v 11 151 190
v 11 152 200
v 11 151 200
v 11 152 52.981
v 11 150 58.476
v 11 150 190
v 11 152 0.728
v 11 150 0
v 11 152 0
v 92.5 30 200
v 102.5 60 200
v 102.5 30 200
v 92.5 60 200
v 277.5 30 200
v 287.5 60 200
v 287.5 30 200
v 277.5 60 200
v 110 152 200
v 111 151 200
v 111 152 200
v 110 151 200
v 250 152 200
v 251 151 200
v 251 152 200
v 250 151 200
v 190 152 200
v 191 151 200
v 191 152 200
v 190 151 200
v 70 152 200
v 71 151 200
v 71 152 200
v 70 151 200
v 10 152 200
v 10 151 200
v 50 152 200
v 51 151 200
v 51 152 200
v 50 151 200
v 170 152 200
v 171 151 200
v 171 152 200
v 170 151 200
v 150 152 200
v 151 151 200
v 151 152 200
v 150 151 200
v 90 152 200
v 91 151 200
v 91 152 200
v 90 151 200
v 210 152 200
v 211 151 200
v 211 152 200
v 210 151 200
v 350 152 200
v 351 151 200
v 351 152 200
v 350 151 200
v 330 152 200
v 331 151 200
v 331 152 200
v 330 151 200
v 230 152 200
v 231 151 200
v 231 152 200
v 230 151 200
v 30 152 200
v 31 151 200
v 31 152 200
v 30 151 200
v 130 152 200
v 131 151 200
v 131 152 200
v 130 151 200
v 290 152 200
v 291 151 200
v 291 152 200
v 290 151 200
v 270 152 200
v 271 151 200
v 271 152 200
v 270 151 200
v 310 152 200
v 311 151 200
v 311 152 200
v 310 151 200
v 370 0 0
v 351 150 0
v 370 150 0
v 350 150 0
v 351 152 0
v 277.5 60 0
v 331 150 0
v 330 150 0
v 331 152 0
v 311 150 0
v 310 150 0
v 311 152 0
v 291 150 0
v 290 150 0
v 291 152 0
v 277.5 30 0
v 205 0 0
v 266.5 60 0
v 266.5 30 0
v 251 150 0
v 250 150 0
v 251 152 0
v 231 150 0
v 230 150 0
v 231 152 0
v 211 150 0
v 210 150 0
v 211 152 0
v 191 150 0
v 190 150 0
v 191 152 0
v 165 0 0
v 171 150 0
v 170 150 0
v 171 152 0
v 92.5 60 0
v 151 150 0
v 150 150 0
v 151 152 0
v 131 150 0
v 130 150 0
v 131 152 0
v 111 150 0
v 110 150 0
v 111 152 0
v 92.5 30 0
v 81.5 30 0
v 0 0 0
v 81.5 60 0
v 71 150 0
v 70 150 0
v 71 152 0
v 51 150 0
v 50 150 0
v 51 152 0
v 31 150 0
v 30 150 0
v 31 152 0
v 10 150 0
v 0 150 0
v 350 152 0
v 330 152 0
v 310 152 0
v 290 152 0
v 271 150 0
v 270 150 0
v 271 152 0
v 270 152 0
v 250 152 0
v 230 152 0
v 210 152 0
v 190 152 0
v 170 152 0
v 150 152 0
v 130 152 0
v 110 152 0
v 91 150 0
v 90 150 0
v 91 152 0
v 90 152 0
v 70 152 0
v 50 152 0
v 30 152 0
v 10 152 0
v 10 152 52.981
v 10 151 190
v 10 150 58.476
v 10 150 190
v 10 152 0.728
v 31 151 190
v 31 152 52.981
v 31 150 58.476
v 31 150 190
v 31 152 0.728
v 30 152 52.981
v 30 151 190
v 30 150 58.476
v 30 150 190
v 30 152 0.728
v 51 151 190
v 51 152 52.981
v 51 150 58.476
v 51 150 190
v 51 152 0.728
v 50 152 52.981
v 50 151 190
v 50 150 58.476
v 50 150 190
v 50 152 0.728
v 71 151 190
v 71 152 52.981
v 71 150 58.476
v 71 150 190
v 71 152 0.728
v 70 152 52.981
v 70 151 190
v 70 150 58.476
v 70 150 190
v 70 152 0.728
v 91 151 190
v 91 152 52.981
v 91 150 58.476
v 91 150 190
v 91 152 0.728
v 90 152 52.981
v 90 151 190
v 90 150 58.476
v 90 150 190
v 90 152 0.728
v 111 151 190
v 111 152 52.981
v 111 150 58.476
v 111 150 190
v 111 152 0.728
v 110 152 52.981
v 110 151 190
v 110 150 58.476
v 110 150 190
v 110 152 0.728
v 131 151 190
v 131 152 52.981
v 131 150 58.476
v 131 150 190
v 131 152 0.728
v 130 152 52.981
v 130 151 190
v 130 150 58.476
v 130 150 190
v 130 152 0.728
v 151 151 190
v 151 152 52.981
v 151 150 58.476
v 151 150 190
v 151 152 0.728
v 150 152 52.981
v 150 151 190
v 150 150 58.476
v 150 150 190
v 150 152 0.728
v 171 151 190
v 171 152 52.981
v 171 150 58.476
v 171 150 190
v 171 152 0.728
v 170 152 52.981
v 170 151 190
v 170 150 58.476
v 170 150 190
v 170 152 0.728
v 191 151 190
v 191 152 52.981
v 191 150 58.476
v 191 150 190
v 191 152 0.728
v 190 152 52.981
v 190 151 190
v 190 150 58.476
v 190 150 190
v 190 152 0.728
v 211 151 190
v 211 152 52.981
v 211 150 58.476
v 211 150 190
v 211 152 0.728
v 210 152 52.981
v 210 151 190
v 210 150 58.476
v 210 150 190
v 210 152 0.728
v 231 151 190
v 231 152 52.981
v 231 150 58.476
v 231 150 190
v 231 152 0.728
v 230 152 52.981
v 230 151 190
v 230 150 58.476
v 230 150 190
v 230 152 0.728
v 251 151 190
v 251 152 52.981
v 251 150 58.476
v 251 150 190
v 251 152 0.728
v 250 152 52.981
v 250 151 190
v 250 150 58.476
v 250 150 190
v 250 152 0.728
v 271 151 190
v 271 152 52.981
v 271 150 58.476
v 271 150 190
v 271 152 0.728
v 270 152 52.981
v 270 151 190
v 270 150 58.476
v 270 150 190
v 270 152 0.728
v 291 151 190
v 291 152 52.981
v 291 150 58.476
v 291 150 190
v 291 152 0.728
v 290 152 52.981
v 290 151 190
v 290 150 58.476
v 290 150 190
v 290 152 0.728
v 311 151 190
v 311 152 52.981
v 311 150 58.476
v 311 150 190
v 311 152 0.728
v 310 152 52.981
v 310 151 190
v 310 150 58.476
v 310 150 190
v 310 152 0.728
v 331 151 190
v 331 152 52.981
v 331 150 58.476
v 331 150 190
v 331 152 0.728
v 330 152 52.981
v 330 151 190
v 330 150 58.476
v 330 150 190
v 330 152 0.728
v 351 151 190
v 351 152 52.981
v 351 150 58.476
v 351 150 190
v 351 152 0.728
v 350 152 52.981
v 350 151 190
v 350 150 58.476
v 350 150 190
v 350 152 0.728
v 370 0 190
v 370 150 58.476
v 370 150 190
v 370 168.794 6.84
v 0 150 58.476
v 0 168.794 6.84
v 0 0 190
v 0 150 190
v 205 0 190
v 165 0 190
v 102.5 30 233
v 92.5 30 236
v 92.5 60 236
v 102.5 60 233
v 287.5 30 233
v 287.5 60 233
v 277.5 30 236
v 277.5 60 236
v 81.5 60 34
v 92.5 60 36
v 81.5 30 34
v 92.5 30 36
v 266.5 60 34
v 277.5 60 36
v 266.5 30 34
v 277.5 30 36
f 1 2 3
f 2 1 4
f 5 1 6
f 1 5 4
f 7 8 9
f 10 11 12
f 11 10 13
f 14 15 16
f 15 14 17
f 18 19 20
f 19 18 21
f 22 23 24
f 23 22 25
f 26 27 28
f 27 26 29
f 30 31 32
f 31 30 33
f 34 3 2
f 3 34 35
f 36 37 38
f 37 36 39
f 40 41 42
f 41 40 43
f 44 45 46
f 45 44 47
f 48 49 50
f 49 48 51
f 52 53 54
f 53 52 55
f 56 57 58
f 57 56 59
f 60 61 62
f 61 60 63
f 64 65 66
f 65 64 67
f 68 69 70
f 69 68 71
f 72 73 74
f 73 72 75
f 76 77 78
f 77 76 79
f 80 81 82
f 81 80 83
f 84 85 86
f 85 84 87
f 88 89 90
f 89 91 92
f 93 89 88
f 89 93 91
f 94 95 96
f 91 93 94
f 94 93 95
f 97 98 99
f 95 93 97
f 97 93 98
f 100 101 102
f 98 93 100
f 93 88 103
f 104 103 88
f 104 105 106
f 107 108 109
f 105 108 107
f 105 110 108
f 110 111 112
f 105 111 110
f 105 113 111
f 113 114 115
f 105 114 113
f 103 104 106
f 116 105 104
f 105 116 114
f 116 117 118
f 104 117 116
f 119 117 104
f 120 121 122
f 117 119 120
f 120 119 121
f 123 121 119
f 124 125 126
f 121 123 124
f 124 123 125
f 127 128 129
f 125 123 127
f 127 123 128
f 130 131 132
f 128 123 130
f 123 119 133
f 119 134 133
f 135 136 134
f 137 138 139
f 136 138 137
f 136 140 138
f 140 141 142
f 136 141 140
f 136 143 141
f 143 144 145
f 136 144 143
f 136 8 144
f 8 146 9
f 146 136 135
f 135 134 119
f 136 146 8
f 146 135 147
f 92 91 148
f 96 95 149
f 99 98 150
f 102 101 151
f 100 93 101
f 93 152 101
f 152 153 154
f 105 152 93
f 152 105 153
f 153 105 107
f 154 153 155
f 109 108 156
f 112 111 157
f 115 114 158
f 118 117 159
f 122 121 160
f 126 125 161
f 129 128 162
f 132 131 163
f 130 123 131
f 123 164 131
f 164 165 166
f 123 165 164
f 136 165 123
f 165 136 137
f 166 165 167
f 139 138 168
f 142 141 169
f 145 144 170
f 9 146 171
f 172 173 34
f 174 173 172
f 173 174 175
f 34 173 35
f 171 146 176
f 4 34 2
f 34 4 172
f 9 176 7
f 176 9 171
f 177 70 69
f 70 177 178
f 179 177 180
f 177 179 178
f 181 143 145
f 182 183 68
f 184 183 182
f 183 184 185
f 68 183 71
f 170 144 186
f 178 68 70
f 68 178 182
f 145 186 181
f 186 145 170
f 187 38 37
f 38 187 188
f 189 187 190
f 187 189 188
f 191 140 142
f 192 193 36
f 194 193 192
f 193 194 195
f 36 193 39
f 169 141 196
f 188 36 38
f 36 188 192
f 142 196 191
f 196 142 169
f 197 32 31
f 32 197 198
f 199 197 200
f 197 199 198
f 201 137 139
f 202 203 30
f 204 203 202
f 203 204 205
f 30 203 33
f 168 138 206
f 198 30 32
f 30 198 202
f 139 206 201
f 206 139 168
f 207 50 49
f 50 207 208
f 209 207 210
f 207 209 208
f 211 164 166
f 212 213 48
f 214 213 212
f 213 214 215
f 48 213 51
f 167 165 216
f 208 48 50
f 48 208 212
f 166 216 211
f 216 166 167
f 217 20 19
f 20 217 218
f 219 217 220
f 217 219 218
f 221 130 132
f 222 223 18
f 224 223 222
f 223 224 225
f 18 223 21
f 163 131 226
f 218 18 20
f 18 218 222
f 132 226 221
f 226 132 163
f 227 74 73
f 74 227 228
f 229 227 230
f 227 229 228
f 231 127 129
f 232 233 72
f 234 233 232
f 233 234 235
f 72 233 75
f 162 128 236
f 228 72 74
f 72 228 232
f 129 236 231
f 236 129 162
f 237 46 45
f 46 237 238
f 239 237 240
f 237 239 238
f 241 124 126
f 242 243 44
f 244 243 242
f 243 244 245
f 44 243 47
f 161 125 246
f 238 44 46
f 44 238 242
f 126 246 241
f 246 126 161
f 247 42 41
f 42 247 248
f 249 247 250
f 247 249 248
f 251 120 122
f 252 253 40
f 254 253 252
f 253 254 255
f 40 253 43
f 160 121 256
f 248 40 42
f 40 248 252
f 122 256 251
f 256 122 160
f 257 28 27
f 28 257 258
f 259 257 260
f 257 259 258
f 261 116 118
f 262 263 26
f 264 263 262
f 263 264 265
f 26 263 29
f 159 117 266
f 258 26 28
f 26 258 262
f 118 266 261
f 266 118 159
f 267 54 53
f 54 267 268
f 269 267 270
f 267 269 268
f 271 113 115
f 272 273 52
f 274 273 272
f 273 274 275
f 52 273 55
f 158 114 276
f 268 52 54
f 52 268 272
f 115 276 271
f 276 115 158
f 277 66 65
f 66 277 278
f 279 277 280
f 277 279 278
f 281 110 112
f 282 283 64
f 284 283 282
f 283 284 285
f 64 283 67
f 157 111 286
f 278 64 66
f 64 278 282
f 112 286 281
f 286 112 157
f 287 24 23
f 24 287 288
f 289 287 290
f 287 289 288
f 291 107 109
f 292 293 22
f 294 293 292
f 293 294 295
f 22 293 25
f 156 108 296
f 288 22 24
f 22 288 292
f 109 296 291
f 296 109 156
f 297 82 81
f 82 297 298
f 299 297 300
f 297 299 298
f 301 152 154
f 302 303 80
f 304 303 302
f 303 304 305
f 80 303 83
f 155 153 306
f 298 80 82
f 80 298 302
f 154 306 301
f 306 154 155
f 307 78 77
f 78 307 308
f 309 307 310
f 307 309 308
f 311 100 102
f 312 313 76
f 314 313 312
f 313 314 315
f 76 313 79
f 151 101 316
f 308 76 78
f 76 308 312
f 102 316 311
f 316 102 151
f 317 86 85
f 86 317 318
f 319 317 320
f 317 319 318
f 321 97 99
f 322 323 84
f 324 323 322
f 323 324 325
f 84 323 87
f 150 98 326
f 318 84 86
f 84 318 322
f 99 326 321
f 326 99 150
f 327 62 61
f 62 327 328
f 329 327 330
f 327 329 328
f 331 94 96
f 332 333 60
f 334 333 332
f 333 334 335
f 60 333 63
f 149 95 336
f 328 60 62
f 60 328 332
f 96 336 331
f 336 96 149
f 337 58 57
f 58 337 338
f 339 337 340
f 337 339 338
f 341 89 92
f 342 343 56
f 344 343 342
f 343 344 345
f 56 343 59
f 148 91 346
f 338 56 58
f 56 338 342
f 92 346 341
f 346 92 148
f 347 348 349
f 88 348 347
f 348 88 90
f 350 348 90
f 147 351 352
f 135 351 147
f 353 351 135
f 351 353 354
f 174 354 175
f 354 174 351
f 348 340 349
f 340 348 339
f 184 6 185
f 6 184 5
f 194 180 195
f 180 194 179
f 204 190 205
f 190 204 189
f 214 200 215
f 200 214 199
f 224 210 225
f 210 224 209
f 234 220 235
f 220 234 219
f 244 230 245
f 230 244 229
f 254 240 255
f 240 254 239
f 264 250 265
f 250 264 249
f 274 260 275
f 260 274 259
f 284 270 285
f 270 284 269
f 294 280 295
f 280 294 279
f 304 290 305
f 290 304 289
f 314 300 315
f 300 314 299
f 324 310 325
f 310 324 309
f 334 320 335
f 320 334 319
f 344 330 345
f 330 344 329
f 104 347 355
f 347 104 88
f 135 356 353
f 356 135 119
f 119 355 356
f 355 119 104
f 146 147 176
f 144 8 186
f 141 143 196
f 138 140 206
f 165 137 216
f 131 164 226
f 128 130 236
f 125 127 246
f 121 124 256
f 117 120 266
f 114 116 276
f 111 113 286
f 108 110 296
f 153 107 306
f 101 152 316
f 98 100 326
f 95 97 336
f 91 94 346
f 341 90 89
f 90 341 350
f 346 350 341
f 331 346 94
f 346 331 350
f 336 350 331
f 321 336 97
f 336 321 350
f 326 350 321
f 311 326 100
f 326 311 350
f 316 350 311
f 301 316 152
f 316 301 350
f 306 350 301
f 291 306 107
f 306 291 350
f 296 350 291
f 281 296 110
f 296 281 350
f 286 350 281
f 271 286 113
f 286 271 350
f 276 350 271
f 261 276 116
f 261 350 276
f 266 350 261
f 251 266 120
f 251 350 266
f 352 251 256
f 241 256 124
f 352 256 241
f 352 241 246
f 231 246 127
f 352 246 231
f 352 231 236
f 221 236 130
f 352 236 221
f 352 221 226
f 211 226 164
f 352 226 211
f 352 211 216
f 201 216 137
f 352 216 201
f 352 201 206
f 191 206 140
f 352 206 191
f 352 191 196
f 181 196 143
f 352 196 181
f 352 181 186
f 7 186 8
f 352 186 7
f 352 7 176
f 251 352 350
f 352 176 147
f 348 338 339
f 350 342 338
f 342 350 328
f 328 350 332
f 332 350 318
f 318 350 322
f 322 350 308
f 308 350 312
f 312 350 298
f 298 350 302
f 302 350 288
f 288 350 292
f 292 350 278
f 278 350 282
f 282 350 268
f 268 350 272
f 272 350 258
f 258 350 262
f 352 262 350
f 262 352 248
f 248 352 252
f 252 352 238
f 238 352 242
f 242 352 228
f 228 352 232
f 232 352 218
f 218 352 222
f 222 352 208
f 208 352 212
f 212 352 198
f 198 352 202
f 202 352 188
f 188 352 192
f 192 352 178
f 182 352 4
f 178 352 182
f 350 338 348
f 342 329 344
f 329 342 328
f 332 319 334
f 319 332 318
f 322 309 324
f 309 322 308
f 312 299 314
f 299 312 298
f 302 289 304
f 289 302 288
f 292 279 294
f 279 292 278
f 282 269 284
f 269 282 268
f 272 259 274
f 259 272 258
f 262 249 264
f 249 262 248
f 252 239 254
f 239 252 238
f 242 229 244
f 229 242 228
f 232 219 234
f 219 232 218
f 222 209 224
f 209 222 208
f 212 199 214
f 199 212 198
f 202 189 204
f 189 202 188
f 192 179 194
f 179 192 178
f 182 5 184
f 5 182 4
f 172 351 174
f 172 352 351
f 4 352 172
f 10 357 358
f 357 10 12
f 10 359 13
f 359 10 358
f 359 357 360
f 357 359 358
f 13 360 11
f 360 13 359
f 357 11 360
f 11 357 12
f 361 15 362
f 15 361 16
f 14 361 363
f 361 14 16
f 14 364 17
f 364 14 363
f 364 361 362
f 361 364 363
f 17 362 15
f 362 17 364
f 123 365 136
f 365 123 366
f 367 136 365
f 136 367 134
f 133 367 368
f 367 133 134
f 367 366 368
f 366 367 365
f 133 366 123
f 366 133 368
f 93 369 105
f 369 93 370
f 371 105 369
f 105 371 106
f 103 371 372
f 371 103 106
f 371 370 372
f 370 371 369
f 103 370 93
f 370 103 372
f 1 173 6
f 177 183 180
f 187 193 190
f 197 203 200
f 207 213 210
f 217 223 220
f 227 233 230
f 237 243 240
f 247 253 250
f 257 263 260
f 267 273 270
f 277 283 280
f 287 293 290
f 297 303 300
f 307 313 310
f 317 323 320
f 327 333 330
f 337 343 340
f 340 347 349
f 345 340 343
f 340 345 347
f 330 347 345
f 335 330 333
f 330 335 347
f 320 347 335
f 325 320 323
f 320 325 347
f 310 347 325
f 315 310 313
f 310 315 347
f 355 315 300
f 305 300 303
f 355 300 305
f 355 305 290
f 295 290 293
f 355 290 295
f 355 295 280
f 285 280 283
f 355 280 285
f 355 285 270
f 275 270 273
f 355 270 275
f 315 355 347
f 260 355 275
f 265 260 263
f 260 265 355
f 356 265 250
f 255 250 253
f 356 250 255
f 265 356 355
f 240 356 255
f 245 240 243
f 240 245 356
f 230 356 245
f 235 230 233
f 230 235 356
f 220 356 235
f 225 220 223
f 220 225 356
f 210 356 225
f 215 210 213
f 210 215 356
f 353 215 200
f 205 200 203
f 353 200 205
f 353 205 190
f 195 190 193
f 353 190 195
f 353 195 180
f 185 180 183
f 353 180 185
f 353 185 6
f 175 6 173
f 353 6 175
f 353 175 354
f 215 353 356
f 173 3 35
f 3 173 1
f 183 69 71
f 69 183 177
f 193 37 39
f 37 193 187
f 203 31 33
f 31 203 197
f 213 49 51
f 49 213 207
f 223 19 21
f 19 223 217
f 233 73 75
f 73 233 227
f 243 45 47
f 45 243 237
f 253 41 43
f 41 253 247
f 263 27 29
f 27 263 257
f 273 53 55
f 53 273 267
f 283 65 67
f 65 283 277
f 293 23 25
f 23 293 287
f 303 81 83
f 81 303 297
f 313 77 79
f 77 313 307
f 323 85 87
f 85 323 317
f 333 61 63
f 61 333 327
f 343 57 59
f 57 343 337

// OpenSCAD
// WATERFALL WALL BLOCK — modular, single-piece, 370mm wide
// Each block stacks to form a 200mm tall layer of the waterfall wall
// Dovetail interlocks on top/bottom for stacking
// Water flows over the front spillway lip
// Back has a recessed water channel that distributes to the top block

// Print: PLA or PETG (no structural load), 0.2mm layer, NO supports needed

/* [Block Dimensions] */
BLOCK_W = 370;          // mm — max single-piece on 392mm bed
BLOCK_H = 200;          // mm — height per block
BLOCK_D = 150;          // mm — depth front-to-back
WALL = 3;               // mm — wall thickness

/* [Spillway] */
SPILL_ANGLE = 20;       // degrees — how far the spillway lip angles forward
LIP_RADIUS = 8;         // mm — rounded lip for smooth water flow
WATER_GUIDE_DEPTH = 5;  // mm — shallow grooves on spillway to guide water evenly

/* [Interlock] */
DOVETAIL_WIDTH = 30;    // mm — dovetail slot width
DOVETAIL_DEPTH = 10;    // mm — depth of interlock

$fn = 32;

// The block body
module block_body() {
    // Main body
    cube([BLOCK_W, BLOCK_D, BLOCK_H]);
    
    // Spillway front face — angled slightly forward
    // This is where water cascades over
    translate([0, BLOCK_D, 0]) {
        rotate([SPILL_ANGLE, 0, 0]) {
            cube([BLOCK_W, 20, BLOCK_H]);
        }
    }
    
    // Water guide grooves on the spillway face
    // These channels keep the water spread evenly across the full width
    for (x = [10: 20: BLOCK_W - 10]) {
        translate([x, BLOCK_D - 2, 0]) {
            cube([1, 4, BLOCK_H]);
        }
    }
}

// Dovetail male (top) — slots into the block above
module dovetail_male() {
    for (x = [(BLOCK_W/4): (BLOCK_W/2): (BLOCK_W * 3/4)]) {
        translate([x, BLOCK_D/2 - DOVETAIL_WIDTH/2, BLOCK_H]) {
            rotate([90, 0, 0]) {
                linear_extrude(height=DOVETAIL_WIDTH) {
                    polygon(points=[
                        [0, 0],
                        [DOVETAIL_DEPTH, -WALL],
                        [DOVETAIL_DEPTH, DOVETAIL_WIDTH + WALL],
                        [0, DOVETAIL_WIDTH + WALL*2],
                    ]);
                }
            }
        }
    }
}

// Dovetail female (bottom)
module dovetail_female() {
    for (x = [(BLOCK_W/4): (BLOCK_W/2): (BLOCK_W * 3/4)]) {
        translate([x, BLOCK_D/2 - DOVETAIL_WIDTH/2, -1]) {
            rotate([90, 0, 0]) {
                linear_extrude(height=DOVETAIL_WIDTH) {
                    polygon(points=[
                        [0, -1],
                        [-DOVETAIL_DEPTH - 1, -WALL - 2],
                        [-DOVETAIL_DEPTH - 1, DOVETAIL_WIDTH + WALL + 2],
                        [0, DOVETAIL_WIDTH + WALL*2 + 1],
                    ]);
                }
            }
        }
    }
}

// Water channel on the back — water flows up through this
module back_water_channel() {
    // Vertical distribution channel — centered on the back face
    channel_w = 40;
    channel_d = 15;
    translate([BLOCK_W/2 - channel_w/2, -channel_d, 0]) {
        cube([channel_w, channel_d, BLOCK_H]);
    }
    
    // Top manifold slot — distributes water across the top
    // Water enters here from the block below, then spills over the front
    translate([-WALL, -channel_d, BLOCK_H - 10]) {
        cube([BLOCK_W + WALL*2, channel_d + BLOCK_D + 1, 10]);
    }
    
    // Small distribution channels at the top — spread water evenly
    for (x = [0: 20: BLOCK_W]) {
        translate([x, -channel_d - 5, BLOCK_H - 12]) {
            cube([1, 5, 12]);
        }
    }
}

// Assembly
difference() {
    union() {
        block_body();
        dovetail_male();
    }
    dovetail_female();
    back_water_channel();
}

echo(str("Block: ", BLOCK_W, "×", BLOCK_D, "×", BLOCK_H, "mm — fits bed: ", BLOCK_W < 392));
